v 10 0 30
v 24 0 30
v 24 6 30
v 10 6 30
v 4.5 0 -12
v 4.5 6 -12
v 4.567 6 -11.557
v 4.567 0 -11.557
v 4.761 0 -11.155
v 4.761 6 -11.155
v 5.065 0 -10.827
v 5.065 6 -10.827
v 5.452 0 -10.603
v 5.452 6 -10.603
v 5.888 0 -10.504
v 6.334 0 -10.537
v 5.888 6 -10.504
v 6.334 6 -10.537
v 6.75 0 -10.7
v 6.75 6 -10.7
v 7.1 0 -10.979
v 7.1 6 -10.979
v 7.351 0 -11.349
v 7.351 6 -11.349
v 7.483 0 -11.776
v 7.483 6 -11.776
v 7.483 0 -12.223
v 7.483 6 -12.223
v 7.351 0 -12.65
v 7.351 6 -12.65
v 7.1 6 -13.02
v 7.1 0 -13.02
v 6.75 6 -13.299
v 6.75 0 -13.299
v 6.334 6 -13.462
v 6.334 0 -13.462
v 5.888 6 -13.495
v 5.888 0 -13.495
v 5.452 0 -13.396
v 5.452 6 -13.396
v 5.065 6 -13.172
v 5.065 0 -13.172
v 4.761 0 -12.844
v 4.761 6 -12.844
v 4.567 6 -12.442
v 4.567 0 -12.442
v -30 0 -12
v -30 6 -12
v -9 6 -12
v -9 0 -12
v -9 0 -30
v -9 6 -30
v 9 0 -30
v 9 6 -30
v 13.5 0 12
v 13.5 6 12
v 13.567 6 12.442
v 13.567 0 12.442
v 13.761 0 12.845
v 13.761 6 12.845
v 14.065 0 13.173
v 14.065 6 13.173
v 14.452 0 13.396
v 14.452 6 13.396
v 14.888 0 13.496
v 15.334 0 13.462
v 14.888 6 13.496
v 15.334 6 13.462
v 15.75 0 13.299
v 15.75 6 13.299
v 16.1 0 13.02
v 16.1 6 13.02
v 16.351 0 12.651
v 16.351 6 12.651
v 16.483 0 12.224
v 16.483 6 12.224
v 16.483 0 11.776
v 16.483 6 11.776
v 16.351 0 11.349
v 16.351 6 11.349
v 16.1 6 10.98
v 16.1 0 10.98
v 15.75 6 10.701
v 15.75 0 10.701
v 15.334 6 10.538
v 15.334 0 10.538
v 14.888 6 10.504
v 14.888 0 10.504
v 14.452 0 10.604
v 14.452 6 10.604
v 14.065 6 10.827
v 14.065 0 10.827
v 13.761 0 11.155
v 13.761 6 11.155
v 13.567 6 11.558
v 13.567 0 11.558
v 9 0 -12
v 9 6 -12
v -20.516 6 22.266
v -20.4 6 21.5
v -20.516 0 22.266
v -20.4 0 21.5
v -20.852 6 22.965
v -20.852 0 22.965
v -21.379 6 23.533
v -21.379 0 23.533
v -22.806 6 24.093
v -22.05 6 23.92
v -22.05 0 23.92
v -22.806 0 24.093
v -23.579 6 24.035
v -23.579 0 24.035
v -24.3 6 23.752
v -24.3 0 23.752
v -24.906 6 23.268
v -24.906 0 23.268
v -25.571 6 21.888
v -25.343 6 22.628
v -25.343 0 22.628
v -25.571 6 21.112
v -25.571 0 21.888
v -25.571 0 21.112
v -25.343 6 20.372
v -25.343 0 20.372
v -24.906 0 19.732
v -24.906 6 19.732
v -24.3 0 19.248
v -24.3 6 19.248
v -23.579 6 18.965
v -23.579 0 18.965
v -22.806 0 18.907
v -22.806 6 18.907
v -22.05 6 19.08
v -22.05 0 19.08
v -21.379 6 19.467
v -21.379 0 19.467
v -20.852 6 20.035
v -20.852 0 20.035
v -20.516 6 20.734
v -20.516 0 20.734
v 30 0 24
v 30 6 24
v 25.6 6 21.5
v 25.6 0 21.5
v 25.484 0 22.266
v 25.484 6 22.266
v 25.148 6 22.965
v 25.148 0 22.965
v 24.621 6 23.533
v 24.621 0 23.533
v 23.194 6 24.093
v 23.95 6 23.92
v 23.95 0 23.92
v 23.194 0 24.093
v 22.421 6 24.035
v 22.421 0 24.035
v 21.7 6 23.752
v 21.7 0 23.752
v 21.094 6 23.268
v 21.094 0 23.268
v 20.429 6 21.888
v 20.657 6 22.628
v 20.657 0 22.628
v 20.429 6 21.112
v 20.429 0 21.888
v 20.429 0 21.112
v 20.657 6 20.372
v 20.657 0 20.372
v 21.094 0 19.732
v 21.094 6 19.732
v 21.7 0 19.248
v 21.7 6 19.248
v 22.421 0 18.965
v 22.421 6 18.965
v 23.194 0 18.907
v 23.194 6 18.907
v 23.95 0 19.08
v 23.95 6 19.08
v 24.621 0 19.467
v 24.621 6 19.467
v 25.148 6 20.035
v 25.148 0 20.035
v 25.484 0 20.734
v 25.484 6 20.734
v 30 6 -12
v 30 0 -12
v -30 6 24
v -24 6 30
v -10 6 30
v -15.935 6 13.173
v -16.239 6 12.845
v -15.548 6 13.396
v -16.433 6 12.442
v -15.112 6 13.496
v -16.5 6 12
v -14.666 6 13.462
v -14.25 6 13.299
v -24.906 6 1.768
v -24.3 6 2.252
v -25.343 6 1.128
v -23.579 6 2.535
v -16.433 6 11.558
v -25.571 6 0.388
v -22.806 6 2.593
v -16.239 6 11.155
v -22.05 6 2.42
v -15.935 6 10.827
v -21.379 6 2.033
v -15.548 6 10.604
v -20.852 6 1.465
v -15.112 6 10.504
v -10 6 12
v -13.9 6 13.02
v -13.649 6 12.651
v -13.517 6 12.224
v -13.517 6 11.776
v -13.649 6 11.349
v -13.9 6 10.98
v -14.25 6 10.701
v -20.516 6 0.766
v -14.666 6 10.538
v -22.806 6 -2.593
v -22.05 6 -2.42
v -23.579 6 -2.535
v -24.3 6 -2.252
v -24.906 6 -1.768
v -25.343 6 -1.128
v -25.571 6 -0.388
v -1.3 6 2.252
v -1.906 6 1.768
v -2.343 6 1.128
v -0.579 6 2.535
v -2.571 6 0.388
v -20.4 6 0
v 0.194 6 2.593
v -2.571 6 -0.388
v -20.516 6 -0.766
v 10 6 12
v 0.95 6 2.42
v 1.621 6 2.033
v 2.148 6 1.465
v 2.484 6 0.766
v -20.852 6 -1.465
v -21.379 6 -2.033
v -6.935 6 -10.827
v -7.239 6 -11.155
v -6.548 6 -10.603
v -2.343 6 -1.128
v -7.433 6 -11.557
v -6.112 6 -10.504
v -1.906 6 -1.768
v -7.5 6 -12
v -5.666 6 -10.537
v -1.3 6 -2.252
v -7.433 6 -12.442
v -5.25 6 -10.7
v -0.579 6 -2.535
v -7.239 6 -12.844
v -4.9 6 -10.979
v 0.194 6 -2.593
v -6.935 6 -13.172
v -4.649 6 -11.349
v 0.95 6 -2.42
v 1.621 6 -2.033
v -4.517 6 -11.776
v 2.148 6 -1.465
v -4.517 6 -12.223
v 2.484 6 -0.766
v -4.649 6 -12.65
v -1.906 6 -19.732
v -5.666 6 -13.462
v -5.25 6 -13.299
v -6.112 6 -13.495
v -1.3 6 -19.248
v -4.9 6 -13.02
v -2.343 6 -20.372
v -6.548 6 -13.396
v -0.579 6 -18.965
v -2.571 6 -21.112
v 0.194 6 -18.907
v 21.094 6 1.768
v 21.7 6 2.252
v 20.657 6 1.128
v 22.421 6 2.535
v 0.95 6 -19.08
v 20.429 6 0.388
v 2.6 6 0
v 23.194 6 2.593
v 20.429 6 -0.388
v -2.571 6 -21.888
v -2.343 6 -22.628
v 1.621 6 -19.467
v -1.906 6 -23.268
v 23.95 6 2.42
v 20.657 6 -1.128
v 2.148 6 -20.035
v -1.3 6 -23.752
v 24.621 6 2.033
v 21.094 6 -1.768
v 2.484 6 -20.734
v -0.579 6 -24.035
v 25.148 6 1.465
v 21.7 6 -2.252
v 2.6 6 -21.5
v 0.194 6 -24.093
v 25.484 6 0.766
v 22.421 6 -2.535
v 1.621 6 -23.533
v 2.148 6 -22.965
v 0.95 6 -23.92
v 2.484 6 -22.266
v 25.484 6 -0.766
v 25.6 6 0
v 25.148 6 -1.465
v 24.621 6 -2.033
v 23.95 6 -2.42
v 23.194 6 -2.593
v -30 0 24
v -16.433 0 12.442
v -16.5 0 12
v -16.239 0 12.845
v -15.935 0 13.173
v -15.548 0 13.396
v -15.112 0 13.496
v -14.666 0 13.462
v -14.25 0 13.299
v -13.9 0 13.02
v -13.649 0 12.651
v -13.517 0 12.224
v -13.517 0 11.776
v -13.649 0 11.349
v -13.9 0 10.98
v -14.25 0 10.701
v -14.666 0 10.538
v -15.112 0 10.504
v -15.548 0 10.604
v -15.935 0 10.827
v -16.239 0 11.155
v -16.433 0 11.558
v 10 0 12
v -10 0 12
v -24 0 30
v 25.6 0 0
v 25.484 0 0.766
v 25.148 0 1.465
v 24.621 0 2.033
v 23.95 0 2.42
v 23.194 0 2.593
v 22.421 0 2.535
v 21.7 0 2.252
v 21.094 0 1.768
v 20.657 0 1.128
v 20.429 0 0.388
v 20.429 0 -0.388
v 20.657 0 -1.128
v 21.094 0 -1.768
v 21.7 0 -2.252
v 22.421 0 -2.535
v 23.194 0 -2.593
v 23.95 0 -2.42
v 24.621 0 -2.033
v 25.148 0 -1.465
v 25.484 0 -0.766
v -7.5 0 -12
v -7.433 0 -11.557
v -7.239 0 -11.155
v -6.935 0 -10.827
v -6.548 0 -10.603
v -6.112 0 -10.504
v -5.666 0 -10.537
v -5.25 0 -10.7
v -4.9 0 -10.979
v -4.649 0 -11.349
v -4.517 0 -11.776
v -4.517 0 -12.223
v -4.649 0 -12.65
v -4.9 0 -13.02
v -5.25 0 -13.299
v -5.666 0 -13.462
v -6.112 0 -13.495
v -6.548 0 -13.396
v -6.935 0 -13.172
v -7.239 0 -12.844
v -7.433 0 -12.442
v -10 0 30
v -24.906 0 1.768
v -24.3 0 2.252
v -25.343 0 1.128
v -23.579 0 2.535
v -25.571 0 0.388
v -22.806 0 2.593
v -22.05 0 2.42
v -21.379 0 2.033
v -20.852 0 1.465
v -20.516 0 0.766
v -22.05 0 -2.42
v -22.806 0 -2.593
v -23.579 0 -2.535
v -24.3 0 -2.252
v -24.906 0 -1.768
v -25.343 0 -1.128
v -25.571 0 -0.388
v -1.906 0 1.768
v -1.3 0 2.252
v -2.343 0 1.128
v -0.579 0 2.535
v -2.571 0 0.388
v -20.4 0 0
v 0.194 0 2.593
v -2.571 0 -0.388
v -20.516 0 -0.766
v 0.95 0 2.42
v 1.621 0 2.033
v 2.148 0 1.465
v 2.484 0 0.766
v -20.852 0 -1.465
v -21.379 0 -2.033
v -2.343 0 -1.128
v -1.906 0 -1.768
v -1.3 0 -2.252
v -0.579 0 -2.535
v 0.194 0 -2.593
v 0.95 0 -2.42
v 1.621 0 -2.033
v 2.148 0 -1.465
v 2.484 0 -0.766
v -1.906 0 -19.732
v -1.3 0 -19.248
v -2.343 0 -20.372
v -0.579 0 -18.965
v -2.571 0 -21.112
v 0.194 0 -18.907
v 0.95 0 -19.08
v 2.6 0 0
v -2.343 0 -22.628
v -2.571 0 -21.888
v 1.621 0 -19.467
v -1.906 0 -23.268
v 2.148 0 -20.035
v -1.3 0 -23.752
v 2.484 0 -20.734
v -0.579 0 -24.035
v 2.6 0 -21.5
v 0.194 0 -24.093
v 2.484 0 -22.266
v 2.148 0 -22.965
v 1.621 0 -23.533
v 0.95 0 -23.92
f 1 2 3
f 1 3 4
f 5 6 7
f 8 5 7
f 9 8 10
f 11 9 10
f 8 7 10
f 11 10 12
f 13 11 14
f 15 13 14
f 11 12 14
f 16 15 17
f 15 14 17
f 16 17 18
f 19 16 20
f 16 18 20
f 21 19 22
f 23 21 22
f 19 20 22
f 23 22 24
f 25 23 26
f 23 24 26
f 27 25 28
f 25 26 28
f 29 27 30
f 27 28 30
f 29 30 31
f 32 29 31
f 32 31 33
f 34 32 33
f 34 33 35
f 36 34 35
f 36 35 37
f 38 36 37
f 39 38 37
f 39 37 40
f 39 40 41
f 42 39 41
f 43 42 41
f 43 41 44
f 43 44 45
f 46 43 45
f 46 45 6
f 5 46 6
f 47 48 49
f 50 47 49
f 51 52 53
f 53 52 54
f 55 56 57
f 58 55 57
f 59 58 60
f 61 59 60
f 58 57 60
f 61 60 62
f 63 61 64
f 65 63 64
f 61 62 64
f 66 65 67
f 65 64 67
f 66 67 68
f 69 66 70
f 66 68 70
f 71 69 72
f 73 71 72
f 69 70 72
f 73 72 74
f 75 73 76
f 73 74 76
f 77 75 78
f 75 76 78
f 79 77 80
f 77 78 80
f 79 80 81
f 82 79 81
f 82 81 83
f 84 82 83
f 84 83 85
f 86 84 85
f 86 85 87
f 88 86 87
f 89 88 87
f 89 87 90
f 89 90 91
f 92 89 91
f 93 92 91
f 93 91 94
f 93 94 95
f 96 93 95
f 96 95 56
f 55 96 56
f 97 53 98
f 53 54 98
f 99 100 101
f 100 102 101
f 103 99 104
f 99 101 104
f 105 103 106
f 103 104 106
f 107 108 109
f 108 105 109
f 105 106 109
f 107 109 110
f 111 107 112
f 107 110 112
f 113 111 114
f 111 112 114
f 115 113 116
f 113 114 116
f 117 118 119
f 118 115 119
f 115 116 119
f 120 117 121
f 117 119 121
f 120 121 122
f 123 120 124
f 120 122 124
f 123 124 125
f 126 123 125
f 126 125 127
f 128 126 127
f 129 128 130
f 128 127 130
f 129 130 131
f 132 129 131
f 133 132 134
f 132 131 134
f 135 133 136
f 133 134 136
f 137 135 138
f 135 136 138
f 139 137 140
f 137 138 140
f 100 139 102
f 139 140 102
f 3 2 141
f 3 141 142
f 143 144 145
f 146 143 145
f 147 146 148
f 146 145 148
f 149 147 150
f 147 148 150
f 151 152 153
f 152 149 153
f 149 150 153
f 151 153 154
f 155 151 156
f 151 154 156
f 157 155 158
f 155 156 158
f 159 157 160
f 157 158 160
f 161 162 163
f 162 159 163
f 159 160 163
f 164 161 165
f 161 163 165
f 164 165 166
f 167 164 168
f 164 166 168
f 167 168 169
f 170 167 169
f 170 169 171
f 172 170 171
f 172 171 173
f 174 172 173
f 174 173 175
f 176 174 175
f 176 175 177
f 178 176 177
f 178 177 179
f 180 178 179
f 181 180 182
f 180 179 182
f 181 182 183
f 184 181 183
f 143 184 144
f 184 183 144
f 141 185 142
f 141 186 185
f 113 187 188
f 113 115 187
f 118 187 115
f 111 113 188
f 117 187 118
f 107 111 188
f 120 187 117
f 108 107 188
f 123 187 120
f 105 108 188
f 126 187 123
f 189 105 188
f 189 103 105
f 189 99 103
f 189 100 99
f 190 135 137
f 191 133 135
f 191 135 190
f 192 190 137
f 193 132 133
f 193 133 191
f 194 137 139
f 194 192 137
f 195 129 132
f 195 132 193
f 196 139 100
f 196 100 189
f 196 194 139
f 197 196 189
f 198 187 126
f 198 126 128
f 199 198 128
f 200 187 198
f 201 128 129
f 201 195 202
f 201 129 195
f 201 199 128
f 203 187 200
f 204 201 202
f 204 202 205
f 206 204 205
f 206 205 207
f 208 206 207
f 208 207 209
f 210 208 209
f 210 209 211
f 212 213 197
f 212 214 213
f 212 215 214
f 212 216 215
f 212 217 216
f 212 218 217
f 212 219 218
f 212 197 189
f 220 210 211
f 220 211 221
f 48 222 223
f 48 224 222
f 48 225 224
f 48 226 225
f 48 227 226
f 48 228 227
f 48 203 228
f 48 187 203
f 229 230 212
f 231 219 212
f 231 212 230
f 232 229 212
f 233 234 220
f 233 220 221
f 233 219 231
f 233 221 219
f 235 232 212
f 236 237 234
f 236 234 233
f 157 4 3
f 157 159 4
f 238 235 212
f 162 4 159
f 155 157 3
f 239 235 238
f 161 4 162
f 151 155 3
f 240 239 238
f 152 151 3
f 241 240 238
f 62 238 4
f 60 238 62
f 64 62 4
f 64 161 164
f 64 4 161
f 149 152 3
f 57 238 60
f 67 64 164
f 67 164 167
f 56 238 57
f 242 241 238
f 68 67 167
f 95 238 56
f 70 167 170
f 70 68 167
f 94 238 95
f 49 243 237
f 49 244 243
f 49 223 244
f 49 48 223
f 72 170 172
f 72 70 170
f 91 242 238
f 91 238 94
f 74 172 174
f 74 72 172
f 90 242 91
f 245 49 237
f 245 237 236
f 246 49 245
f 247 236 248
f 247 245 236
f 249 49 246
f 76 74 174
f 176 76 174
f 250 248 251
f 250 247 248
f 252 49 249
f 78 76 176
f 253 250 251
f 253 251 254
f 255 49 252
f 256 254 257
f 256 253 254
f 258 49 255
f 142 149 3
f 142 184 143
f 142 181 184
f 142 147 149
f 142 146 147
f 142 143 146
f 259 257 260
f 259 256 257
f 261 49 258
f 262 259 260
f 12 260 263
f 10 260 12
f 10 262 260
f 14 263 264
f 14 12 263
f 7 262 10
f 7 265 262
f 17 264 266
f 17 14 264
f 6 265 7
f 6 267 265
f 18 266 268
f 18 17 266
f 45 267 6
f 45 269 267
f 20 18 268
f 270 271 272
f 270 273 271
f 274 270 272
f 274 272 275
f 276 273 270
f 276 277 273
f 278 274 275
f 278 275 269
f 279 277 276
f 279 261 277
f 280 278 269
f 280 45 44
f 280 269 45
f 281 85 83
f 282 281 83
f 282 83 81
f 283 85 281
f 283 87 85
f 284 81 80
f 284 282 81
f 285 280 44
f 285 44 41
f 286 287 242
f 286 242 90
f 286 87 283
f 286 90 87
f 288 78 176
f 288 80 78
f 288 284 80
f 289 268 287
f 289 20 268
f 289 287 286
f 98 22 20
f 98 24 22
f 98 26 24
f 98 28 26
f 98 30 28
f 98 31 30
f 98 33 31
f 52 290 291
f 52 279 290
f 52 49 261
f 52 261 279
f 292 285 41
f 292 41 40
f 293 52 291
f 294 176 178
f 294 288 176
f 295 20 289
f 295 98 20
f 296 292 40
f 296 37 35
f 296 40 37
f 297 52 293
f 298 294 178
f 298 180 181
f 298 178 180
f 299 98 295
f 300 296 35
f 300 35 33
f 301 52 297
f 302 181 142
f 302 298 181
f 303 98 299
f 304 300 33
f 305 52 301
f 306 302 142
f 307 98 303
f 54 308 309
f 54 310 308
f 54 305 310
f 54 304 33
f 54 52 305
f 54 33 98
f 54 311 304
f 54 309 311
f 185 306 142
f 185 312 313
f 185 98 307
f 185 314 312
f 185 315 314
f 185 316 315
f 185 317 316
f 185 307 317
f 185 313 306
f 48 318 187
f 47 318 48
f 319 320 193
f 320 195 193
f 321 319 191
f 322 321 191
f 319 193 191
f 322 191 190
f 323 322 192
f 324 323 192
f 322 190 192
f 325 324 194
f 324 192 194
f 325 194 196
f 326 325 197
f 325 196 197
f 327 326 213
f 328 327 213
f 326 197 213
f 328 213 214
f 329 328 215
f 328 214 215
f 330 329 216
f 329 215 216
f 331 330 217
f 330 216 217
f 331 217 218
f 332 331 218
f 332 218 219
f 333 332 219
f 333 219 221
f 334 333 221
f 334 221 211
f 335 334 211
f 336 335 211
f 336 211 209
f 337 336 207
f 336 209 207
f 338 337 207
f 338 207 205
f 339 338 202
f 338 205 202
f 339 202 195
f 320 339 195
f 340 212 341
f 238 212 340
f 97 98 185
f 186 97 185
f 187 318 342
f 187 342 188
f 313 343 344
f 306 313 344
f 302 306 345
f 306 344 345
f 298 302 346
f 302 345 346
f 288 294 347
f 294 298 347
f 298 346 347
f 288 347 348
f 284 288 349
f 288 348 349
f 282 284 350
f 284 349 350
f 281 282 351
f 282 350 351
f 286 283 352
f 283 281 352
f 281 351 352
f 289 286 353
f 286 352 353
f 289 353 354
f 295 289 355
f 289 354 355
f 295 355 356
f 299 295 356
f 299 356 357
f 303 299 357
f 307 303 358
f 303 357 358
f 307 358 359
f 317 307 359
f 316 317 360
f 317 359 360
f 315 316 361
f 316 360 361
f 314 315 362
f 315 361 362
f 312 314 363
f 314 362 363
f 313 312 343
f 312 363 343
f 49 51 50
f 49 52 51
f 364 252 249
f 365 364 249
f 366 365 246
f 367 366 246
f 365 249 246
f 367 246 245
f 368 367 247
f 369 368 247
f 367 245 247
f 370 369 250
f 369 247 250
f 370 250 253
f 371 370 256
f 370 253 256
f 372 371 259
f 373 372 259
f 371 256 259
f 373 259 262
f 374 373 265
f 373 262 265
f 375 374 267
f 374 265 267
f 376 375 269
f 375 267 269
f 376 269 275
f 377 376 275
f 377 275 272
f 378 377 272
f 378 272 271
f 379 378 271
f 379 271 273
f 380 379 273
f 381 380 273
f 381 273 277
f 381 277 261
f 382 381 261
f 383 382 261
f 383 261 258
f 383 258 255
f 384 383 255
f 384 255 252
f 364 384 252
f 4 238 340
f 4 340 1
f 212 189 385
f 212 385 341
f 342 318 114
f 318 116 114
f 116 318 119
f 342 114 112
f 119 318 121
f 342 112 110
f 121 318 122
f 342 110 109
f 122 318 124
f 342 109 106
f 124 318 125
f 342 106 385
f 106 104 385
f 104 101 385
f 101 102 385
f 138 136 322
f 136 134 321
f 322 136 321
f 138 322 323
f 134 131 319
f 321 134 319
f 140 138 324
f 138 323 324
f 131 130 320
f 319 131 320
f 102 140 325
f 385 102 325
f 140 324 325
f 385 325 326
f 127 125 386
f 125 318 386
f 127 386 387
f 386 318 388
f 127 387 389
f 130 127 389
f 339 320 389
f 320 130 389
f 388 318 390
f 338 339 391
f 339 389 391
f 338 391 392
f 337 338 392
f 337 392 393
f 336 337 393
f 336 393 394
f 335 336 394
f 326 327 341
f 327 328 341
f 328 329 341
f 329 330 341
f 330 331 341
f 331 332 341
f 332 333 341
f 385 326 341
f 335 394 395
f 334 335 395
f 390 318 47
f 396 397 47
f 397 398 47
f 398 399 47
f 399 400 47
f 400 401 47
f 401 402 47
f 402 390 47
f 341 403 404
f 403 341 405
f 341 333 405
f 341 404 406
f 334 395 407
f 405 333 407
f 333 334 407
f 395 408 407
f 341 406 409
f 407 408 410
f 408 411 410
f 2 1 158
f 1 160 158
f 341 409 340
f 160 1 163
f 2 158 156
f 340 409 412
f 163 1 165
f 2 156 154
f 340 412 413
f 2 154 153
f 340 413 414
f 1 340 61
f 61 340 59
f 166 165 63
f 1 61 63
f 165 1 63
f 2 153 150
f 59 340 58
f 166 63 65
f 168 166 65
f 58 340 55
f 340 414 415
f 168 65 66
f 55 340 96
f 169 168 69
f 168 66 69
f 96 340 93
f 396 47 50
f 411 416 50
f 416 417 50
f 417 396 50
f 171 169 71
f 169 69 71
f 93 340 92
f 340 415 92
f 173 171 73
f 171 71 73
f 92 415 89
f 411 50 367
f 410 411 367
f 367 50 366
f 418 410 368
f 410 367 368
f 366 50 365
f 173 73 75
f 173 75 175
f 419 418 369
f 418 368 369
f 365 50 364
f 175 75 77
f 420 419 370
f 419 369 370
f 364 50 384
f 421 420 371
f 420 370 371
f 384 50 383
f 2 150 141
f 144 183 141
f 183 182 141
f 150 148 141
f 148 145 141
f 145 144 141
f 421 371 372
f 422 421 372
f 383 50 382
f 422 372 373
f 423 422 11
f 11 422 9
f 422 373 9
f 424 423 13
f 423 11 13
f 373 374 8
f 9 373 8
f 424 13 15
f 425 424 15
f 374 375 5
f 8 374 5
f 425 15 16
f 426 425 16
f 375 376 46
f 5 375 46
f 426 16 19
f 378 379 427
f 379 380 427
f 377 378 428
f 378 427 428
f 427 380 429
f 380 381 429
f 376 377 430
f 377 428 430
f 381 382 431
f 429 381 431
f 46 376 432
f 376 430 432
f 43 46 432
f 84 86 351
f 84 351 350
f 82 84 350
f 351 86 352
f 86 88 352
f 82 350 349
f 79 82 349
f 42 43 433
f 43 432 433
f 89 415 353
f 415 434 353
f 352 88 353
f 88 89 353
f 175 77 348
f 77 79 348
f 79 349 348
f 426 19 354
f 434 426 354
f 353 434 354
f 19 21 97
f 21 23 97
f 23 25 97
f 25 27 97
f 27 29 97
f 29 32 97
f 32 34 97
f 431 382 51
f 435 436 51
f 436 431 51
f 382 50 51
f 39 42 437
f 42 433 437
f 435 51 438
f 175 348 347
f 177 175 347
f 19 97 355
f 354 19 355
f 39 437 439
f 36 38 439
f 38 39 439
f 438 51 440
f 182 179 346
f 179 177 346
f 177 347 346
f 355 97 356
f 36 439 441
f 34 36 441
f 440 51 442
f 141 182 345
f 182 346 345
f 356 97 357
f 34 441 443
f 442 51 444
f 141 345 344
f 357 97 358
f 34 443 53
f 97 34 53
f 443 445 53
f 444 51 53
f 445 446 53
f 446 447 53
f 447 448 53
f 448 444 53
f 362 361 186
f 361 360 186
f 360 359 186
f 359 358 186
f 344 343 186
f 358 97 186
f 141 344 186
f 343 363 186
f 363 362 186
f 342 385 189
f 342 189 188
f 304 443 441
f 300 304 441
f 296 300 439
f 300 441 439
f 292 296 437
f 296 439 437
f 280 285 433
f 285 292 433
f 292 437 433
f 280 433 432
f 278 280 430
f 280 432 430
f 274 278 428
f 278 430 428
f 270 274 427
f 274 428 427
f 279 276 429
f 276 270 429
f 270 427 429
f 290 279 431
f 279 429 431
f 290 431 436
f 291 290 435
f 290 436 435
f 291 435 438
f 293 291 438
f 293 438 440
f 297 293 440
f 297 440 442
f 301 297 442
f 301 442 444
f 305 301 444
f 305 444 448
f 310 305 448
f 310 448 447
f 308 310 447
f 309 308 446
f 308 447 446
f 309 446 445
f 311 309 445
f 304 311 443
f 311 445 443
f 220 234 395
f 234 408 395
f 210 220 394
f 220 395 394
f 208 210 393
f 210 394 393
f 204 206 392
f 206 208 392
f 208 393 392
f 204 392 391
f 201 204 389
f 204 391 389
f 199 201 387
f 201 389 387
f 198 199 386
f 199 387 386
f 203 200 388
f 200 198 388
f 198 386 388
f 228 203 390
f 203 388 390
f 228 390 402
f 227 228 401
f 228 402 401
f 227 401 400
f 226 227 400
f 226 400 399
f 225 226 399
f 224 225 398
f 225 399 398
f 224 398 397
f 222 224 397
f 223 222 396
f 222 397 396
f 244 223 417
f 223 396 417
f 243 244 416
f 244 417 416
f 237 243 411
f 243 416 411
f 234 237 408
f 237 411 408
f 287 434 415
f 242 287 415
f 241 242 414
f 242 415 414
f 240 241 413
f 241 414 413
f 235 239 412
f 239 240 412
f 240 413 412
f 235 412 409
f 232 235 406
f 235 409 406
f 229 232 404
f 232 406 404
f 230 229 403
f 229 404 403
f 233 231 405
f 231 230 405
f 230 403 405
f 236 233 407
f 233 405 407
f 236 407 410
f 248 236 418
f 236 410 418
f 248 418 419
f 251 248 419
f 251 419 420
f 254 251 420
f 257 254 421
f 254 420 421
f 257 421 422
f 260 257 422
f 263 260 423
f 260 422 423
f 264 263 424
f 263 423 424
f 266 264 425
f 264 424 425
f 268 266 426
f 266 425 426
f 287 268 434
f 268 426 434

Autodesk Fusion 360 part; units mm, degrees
sketch "Sketch1" plane through (0, 0, 0) normal (0, 1, 0) x (1, 0, 0)
  line L0 (30, 30) -> (30, -30)
  line L1 (30, -30) -> (-30, -30)
  line L2 (-30, -30) -> (-30, 30)
  line L3 (-30, 30) -> (30, -30) construction
  line L4 (30, 30) -> (-30, -30) construction
  line L5 (10, 30) -> (10, 50)
  line L6 (10, 50) -> (-10, 50)
  line L7 (-10, 50) -> (-10, 30)
  line L8 (-30, 30) -> (-10, 30)
  line L9 (10, 30) -> (30, 30)
  circle A0 centre (0, 43) radius 2.6
  line L10 (-30, 0) -> (30, 0) construction
  circle A1 centre (0, 21.5) radius 2.6
  circle A2 centre (-23, 21.5) radius 2.6
  circle A3 centre (23, 21.5) radius 2.6
  circle A4 centre (-23, 0) radius 2.6
  circle A5 centre (0, 0) radius 2.6
  circle A6 centre (23, 0) radius 2.6
  circle A7 centre (-23, -21.5) radius 2.6
  circle A8 centre (23, -21.5) radius 2.6
  line L11 (-2.6, -21) -> (-2.6, -22)
  arc A9 (-2.6, -22) -> (2.6, -22) centre (0, -22) ccw
  line L12 (2.6, -22) -> (2.6, -21)
  arc A10 (2.6, -21) -> (-2.6, -21) centre (0, -21) ccw
  point P0 (0, -21.5)
  dimension "d4" = 60
  dimension "d5" = 60
  dimension "d7" = 20
  dimension "d8" = 20
  dimension "d9" = 5.2
  dimension "d10" = 7
  dimension "d11" = 5.2
  dimension "d12" = 21.5
  dimension "d13" = 5.2
  dimension "d14" = 5.2
  dimension "d15" = 23
  dimension "d16" = 23
  dimension "d28" = 5.2
  dimension "d29" = 0.5
extrude "Extrude1" add sketch "Sketch1" along normal blind 6
chamfer "Chamfer1" distance 6 angle 45 4 edges at (30, 3, 30) (30, 3, -30) (-30, 3, 30) (-30, 3, -30)
fillet "Fillet1" radius 3 2 edges at (10, 3, -50) (-10, 3, -50)
fillet "Fillet2" radius 3 2 edges at (10, 3, -30) (-10, 3, -30)
sketch "Sketch2" plane through (0, 6, 0) normal (0, 1, 0) x (-1, 0, 0)
  arc A0 (7, -50) -> (10, -47) centre (7, -47) ccw
  line L0 (10, -47) -> (10, -33)
  arc A1 (13, -30) -> (10, -33) centre (13, -33) ccw
  line L1 (13, -30) -> (24, -30)
  line L2 (24, -30) -> (30, -24)
  line L3 (30, -24) -> (30, 24)
  line L4 (30, 24) -> (24, 30)
  line L5 (24, 30) -> (-24, 30)
  line L6 (-24, 30) -> (-30, 24)
  line L7 (-30, 24) -> (-30, -24)
  line L8 (-30, -24) -> (-24, -30)
  line L9 (-24, -30) -> (-13, -30)
  arc A2 (-10, -33) -> (-13, -30) centre (-13, -33) ccw
  line L10 (-10, -33) -> (-10, -47)
  arc A3 (-10, -47) -> (-7, -50) centre (-7, -47) ccw
  line L11 (-7, -50) -> (7, -50)
  circle A4 centre (23, 0) radius 2.6
  circle A5 centre (0, 0) radius 2.6
  circle A6 centre (0, -21.5) radius 2.6
  circle A7 centre (0, -43) radius 2.6
  circle A8 centre (23, 21.5) radius 2.6
  arc A9 (-2.6, 21) -> (2.6, 21) centre (0, 21) ccw
  line L12 (-2.6, 21) -> (-2.6, 22)
  arc A10 (2.6, 22) -> (-2.6, 22) centre (0, 22) ccw
  line L13 (2.6, 22) -> (2.6, 21)
  circle A11 centre (23, -21.5) radius 2.6
  circle A12 centre (-23, 0) radius 2.6
  circle A13 centre (-23, -21.5) radius 2.6
  circle A14 centre (-23, 21.5) radius 2.6
  line L14 (10, 12) -> (-10, 12)
  line L15 (-10, 12) -> (-10, 30)
  line L16 (10, 30) -> (10, 12)
  line L17 (0, -30) -> (-9, -30)
  line L18 (0, -30) -> (9, -30)
  line L19 (9, -30) -> (9, -12)
  line L20 (-9, -30) -> (-9, -12)
  line L21 (30, -12) -> (9, -12)
  line L22 (-9, -12) -> (-30, -12)
  dimension "d40" = 20
  dimension "d41" = 18
  dimension "d44" = 10
  dimension "d45" = 9
  dimension "d46" = 9.5
  dimension "d47" = 9
  dimension "d48" = 9
  dimension "d49" = 8.5
extrude "Extrude2" cut sketch "Sketch2" against normal blind 6 contours A0 L0 A1 L1 L2 L3 L7 L8 L9 A2 L10 A3 L11 L17 L18 L19 L20 L21 L22 | L5 L14 L15 L16
sketch "Sketch3" plane through (0, 6, 0) normal (0, 1, 0) x (-1, 0, 0)
  circle A0 centre (0, 0) radius 2.6
  circle A1 centre (23, 21.5) radius 2.6
  circle A2 centre (0, -21.5) radius 2.6
  circle A3 centre (23, 0) radius 2.6
  circle A4 centre (-23, 0) radius 2.6
  circle A5 centre (-23, 21.5) radius 2.6
  line L0 (10, 30) -> (10, 12)
  line L1 (10, 12) -> (-10, 12)
  line L2 (-10, 12) -> (-10, 30)
  line L3 (-10, 30) -> (-24, 30)
  line L4 (-24, 30) -> (-30, 24)
  line L5 (-30, 24) -> (-30, -12)
  line L6 (-30, -12) -> (-9, -12)
  line L7 (-9, -12) -> (-9, -30)
  line L8 (-9, -30) -> (9, -30)
  line L9 (9, -30) -> (9, -12)
  line L10 (9, -12) -> (30, -12)
  line L11 (30, -12) -> (30, 24)
  line L12 (30, 24) -> (24, 30)
  line L13 (24, 30) -> (10, 30)
  circle A6 centre (15, 12) radius 1.5
  circle A7 centre (-15, 12) radius 1.5
  circle A8 centre (6, -11.9995) radius 1.5
  circle A9 centre (-6, -11.9995) radius 1.5
  dimension "d53" = 3
  dimension "d54" = 15
  dimension "d55" = 12
  dimension "d56" = 3
  dimension "d57" = 15
  dimension "d58" = 12
  dimension "d59" = 3
  dimension "d60" = 3
  dimension "d61" = 6
  dimension "d62" = 6
  dimension "d63" = 13.416
  dimension "d64" = 13.416
extrude "Extrude3" cut sketch "Sketch3" against normal blind 6 contours A6 | A7 | A8 | A9
equation "larger_hole_radii = 2.6 mm"
equation "small_hole_Radii = 1.25 mm"
equation "base_sqaure_dim = 60 mm"
equation "d4 = base_sqaure_dim"
equation "d5 = base_sqaure_dim"
equation "square_extension = 20 mm"
equation "d7 = square_extension"
equation "d8 = square_extension"
equation "d9 = larger_hole_radii * 2"
equation "d11 = larger_hole_radii * 2"
equation "d13 = 2 * larger_hole_radii"
equation "d14 = 2 * larger_hole_radii"
equation "dist_between_Rows = 21.50 mm"
equation "slot_height = 5.20 mm"
equation "slot_width = 0.50 mm"
equation "d28 = slot_height"
equation "d29 = slot_width"
equation "ext = 6.0 mm"
equation "d31 = ext"
equation "d33 = ext"
equation "fillet_top = 3 mm"
equation "d36 = fillet_top"
equation "d38 = fillet_top"
equation "slot_square_cutout_height = 18 mm"
equation "d40 = square_extension"
equation "d41 = slot_square_cutout_height"
equation "d44 = square_extension / 2"
equation "d45 = slot_square_cutout_height / 2"
equation "d46 = square_extension / 2 - 0.50 mm"
equation "d47 = slot_square_cutout_height / 2"
equation "d48 = slot_square_cutout_height / 2"
equation "d49 = slot_square_cutout_height / 2 - 0.50 mm"
equation "d50 = -ext"
equation "new_small_hole_dia = 3 mm"
equation "d53 = new_small_hole_dia"
equation "d56 = new_small_hole_dia"
equation "d59 = new_small_hole_dia"
equation "d60 = new_small_hole_dia"
equation "d65 = -ext"
